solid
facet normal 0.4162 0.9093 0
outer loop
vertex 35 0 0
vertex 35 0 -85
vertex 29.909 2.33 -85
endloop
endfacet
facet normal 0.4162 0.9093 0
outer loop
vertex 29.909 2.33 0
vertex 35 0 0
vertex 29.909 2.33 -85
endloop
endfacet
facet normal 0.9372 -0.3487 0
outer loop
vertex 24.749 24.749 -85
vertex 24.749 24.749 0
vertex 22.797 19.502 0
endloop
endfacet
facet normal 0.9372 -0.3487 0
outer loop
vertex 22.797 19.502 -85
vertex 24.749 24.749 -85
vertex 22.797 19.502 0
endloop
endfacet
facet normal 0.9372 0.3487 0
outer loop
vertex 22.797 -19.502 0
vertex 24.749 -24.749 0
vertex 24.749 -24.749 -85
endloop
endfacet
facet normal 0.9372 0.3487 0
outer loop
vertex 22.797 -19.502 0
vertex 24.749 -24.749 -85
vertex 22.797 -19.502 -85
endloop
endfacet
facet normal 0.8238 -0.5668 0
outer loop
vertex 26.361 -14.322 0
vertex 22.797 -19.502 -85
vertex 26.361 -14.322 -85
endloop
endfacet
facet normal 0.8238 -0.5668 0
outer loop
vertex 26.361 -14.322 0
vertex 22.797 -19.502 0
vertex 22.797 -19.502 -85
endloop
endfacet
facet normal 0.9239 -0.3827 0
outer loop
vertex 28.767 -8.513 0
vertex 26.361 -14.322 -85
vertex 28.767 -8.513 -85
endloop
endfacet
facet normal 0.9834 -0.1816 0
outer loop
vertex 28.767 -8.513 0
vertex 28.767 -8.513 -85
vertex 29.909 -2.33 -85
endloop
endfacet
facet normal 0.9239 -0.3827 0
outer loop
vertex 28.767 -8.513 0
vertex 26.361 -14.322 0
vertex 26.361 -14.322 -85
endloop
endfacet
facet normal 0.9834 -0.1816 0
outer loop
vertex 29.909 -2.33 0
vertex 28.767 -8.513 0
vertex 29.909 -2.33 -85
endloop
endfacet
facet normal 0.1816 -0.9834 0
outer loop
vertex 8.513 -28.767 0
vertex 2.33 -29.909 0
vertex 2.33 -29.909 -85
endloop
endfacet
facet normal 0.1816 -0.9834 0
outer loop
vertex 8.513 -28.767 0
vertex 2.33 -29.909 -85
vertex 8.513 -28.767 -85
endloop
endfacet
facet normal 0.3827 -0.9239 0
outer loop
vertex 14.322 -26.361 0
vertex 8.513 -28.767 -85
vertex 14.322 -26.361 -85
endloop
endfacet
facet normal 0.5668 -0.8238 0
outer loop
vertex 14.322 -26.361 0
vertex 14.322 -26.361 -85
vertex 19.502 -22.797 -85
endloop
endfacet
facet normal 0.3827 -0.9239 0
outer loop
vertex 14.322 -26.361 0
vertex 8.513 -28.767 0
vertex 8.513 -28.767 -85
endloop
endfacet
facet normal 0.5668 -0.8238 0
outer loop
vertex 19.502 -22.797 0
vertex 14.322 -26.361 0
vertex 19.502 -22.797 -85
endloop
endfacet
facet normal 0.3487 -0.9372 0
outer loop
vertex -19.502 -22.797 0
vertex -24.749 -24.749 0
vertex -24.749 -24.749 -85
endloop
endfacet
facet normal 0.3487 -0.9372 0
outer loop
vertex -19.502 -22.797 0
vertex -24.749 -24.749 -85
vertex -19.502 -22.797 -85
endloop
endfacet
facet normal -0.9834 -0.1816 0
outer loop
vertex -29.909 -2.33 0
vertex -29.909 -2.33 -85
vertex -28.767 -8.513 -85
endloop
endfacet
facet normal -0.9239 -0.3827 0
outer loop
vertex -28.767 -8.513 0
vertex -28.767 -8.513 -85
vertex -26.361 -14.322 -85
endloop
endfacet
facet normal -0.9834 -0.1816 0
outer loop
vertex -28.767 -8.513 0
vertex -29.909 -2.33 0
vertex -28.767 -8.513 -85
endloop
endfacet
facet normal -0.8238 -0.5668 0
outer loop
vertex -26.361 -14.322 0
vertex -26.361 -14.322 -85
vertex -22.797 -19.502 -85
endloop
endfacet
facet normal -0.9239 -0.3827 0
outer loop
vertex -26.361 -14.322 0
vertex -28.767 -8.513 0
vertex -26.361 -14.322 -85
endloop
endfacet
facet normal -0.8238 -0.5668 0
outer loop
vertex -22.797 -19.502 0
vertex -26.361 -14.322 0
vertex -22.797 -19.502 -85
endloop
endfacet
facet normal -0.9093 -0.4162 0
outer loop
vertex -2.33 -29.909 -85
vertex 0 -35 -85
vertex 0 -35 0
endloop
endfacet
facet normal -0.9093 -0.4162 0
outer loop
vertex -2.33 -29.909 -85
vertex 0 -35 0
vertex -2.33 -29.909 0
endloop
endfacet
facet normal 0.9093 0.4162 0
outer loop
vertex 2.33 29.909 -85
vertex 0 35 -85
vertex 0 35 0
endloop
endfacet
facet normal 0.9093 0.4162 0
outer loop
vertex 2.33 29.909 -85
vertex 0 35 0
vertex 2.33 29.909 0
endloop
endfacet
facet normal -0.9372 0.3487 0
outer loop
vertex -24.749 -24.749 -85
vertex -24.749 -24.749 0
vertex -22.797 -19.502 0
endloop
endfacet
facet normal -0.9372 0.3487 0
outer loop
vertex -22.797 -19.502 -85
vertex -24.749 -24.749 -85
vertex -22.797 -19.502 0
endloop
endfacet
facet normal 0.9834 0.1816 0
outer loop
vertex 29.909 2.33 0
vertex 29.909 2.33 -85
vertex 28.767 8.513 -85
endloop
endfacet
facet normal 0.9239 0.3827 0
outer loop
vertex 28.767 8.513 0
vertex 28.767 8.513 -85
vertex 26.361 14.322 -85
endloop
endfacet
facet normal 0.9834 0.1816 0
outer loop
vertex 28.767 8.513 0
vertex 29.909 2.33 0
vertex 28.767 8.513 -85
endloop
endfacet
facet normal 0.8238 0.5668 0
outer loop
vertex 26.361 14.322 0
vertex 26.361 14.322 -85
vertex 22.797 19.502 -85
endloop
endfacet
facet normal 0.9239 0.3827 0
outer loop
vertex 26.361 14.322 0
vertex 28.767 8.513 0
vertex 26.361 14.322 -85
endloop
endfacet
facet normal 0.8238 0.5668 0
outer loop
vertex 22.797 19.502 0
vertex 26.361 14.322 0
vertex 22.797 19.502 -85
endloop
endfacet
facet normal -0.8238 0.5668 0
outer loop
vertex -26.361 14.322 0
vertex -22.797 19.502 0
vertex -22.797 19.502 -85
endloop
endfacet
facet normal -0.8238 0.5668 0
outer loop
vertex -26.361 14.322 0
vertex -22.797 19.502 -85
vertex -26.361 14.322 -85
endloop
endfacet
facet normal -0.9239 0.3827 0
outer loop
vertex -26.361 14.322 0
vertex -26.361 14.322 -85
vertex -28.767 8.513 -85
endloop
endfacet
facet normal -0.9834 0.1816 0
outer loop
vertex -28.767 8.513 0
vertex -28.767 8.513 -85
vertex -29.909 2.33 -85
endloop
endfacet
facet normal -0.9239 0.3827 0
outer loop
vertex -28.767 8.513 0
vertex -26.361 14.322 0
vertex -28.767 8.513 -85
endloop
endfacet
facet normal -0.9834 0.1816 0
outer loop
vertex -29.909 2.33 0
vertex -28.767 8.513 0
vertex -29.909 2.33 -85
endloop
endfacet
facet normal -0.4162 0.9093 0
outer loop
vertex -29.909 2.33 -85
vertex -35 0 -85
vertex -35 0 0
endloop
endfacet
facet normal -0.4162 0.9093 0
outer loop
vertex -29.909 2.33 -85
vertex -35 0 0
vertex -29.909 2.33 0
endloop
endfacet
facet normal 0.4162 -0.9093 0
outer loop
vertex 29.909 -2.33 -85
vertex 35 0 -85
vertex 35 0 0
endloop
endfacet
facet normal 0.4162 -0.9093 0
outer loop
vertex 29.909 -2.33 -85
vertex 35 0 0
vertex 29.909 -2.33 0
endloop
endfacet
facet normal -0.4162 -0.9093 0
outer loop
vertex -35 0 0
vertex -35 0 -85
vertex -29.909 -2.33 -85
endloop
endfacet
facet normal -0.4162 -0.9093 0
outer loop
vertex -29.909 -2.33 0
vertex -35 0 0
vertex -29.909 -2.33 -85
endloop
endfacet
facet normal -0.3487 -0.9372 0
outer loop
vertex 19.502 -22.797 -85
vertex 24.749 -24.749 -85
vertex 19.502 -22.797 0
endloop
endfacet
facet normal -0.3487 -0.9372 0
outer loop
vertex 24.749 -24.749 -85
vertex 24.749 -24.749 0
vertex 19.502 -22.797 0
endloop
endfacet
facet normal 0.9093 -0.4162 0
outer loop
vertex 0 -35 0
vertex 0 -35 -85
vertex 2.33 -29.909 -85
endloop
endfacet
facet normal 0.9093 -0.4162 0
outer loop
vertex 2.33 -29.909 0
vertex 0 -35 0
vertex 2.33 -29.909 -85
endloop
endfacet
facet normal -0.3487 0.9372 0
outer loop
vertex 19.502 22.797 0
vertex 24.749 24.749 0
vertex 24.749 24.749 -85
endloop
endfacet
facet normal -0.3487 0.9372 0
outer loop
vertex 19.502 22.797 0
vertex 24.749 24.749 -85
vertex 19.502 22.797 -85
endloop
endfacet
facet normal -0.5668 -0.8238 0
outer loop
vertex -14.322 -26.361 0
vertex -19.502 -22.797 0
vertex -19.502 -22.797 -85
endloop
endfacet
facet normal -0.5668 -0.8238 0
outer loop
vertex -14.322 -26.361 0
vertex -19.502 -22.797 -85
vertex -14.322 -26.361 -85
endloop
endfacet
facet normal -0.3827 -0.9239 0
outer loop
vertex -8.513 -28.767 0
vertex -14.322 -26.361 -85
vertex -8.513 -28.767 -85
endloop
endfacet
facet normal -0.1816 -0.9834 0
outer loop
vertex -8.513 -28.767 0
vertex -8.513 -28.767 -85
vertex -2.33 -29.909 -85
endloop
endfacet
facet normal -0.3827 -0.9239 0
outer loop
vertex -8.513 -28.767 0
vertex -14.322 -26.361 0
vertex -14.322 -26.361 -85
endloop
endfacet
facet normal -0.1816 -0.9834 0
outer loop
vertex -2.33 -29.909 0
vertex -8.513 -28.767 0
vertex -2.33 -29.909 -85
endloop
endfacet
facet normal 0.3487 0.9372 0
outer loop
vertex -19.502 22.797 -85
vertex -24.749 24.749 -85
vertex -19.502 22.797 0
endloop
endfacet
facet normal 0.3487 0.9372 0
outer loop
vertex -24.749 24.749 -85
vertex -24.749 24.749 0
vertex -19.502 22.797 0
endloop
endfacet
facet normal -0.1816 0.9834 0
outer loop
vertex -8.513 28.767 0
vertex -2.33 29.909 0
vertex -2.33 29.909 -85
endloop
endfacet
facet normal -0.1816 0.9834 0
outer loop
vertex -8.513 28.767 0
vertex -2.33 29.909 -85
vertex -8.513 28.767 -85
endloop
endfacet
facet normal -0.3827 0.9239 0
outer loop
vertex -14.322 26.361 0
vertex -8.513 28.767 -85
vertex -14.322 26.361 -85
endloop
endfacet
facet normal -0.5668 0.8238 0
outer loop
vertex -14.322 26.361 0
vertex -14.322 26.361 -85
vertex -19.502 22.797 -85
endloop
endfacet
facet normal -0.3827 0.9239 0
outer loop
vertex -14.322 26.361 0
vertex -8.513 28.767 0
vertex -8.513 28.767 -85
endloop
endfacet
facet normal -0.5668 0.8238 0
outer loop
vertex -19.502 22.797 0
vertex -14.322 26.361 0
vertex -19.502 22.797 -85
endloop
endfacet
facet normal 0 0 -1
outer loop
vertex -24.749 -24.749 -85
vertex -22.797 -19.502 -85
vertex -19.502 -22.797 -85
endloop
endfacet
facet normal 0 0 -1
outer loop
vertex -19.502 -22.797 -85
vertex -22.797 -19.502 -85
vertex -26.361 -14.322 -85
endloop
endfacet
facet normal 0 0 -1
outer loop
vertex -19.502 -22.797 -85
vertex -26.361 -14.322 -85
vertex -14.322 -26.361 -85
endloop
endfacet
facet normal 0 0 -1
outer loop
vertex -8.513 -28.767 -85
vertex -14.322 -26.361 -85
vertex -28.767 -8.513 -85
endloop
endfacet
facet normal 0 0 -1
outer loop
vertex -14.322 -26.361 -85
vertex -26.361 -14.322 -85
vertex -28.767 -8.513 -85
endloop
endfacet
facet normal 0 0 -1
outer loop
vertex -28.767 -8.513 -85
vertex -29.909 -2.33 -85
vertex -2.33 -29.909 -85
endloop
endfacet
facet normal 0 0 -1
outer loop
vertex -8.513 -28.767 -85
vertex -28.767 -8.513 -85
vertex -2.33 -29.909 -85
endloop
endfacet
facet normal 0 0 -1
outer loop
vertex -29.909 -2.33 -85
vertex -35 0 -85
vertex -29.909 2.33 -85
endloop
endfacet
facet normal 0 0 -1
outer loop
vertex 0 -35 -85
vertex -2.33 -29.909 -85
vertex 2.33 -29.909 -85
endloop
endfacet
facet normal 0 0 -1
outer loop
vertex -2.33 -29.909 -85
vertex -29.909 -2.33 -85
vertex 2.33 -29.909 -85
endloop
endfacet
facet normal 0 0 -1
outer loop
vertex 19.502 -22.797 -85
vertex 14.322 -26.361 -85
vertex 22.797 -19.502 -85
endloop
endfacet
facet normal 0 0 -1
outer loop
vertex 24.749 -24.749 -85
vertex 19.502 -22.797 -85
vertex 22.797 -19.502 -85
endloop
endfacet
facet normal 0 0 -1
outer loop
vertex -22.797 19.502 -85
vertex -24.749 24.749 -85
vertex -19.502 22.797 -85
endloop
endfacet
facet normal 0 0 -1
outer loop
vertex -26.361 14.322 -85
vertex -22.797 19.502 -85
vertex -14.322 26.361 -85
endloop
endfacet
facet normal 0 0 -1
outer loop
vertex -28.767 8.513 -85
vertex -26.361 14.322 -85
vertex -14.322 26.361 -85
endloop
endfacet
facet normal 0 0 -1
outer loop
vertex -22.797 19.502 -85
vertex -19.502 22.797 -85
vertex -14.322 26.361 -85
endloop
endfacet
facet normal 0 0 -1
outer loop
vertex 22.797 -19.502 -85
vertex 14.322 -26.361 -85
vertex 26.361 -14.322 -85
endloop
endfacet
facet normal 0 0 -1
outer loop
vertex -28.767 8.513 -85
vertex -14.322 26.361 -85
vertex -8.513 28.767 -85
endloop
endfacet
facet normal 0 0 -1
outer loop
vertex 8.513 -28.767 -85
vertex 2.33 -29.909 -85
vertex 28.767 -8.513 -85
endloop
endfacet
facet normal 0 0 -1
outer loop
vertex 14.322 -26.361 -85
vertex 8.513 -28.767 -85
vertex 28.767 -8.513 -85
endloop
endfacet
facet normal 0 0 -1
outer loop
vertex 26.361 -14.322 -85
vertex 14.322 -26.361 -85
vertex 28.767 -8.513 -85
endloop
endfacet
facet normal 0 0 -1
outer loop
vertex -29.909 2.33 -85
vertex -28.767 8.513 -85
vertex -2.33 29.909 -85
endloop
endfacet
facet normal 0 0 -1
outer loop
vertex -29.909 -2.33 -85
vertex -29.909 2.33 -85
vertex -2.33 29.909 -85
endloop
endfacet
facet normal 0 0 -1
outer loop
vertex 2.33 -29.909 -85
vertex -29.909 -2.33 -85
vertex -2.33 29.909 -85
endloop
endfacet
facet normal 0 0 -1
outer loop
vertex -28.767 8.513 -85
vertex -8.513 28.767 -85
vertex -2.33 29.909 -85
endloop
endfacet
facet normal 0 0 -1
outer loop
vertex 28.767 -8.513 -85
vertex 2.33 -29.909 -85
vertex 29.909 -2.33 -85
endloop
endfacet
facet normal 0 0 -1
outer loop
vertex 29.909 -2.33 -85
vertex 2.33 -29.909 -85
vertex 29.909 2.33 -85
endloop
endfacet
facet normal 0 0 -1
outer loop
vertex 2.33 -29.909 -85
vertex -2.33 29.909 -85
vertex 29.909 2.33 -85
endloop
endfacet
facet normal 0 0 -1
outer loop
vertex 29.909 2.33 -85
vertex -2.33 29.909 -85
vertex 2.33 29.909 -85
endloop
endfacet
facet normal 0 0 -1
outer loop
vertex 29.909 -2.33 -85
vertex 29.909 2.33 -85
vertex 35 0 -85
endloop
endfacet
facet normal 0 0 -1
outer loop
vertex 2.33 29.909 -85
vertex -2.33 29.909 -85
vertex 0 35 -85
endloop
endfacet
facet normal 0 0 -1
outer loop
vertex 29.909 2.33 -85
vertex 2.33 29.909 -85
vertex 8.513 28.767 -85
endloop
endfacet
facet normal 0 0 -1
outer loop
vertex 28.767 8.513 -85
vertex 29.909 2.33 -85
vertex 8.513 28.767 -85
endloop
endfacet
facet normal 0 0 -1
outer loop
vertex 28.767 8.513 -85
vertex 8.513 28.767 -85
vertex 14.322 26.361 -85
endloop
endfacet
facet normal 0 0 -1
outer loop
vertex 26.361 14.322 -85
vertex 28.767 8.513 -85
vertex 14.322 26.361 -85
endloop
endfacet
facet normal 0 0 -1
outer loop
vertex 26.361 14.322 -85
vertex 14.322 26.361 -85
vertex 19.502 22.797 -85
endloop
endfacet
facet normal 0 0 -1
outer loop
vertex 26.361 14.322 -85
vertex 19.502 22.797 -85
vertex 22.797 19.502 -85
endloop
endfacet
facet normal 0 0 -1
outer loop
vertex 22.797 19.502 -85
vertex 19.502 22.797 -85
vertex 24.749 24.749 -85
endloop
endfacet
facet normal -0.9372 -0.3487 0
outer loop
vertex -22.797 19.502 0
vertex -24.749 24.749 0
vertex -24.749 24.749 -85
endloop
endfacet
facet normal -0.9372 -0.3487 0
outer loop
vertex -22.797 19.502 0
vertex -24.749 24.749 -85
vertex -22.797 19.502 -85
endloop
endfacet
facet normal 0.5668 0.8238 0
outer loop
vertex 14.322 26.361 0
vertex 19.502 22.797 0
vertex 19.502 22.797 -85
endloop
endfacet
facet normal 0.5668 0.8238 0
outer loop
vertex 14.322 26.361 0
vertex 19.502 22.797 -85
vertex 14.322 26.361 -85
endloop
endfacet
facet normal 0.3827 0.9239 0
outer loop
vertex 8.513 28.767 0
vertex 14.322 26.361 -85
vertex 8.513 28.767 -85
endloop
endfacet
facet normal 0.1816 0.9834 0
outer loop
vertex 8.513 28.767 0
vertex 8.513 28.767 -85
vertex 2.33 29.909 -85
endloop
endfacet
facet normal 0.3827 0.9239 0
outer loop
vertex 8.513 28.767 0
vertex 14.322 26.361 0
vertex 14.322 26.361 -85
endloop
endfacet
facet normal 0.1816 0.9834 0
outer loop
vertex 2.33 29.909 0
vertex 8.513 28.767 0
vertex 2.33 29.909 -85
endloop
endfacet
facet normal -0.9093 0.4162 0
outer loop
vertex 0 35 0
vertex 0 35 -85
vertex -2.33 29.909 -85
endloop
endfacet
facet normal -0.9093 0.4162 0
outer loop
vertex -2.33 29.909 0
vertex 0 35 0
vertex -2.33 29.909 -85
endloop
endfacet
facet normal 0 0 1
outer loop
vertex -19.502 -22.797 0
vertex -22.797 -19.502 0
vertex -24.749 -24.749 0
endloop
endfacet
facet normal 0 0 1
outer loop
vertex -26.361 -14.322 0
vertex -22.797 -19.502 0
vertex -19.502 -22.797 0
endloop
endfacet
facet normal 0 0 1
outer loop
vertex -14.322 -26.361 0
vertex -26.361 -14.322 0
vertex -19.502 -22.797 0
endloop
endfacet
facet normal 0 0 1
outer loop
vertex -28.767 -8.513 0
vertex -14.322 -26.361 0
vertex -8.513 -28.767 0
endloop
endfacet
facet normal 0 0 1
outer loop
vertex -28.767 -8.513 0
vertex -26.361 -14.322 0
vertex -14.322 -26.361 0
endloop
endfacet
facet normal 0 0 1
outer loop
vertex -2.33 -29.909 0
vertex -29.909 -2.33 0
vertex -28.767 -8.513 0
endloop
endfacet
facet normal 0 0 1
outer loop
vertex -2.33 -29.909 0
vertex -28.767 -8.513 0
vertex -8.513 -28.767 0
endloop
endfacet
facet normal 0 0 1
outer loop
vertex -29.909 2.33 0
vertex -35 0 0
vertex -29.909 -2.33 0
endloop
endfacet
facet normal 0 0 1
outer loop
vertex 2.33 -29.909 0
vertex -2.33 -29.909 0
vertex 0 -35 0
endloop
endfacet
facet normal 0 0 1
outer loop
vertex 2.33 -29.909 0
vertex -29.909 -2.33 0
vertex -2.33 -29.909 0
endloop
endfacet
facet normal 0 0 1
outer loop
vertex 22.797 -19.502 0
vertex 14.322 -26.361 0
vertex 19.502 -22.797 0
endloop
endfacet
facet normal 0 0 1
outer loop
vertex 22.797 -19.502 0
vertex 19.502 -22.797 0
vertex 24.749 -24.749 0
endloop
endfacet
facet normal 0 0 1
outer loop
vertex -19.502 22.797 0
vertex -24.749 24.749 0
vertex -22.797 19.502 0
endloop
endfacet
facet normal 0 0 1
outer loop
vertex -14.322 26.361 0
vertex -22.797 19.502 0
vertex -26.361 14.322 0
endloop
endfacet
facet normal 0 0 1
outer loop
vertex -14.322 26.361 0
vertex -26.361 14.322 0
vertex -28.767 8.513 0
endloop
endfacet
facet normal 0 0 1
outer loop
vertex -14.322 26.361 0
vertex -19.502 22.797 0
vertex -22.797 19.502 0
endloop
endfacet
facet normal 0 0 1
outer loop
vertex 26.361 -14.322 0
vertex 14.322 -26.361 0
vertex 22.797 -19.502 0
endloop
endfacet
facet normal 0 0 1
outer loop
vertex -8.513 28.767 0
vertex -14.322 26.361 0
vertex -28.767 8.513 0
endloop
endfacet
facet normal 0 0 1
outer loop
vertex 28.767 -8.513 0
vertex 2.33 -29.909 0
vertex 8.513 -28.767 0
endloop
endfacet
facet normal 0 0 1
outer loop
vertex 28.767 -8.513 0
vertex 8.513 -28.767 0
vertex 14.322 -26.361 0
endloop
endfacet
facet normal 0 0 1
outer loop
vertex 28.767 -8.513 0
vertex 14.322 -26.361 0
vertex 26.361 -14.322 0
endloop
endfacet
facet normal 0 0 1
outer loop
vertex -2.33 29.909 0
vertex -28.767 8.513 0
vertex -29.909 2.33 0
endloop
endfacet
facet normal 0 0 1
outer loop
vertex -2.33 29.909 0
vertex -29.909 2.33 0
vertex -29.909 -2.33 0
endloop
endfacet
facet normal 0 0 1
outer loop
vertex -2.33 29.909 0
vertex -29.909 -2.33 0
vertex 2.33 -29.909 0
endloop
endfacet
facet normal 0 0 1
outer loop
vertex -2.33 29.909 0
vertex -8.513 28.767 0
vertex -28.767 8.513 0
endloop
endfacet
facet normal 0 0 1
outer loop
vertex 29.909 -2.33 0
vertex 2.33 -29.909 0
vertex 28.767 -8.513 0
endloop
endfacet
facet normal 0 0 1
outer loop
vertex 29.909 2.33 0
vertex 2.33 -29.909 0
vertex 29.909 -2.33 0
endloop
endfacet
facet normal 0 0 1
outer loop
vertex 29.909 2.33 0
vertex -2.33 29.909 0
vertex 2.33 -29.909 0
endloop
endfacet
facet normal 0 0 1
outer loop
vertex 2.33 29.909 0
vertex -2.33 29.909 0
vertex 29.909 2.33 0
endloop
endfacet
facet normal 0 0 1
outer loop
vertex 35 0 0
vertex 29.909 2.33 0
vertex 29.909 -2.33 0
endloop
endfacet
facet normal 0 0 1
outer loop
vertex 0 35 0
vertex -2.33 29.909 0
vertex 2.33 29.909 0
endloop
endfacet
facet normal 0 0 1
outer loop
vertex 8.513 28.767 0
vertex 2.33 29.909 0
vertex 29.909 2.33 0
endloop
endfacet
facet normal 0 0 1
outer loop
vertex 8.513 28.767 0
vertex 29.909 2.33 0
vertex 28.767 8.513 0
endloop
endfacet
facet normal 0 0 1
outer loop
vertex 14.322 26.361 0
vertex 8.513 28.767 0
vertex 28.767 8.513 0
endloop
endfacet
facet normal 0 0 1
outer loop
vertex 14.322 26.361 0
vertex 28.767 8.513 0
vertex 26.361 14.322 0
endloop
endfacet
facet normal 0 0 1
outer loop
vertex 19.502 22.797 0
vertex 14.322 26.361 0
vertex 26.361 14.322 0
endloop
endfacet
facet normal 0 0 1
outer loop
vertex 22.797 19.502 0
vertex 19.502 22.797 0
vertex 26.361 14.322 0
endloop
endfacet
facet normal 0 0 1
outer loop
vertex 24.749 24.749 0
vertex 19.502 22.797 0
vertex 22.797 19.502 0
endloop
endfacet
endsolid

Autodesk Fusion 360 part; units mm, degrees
sketch "Boceto1" plane through (0, 0, 0) normal (0, 0, 1) x (1, 0, 0)
  line L0 (0, 35) -> (-2.3299, 29.9094)
  line L1 (0, 35) -> (2.3299, 29.9094)
  line L2 (-24.7487, 24.7487) -> (-19.5017, 22.7966)
  line L3 (-24.7487, 24.7487) -> (-22.7966, 19.5017)
  line L4 (-35, 0) -> (-29.9094, 2.3299)
  line L5 (-35, 0) -> (-29.9094, -2.3299)
  line L6 (-24.7487, -24.7487) -> (-22.7966, -19.5017)
  line L7 (-24.7487, -24.7487) -> (-19.5017, -22.7966)
  line L8 (0, -35) -> (-2.3299, -29.9094)
  line L9 (0, -35) -> (2.3299, -29.9094)
  line L10 (24.7487, -24.7487) -> (19.5017, -22.7966)
  line L11 (24.7487, -24.7487) -> (22.7966, -19.5017)
  line L12 (35, 0) -> (29.9094, -2.3299)
  line L13 (35, 0) -> (29.9094, 2.3299)
  line L14 (24.7487, 24.7487) -> (22.7966, 19.5017)
  line L15 (24.7487, 24.7487) -> (19.5017, 22.7966)
  arc A0 (-2.3299, 29.9094) -> (-19.5017, 22.7966) centre (0, 0) ccw
  arc A1 (19.5017, 22.7966) -> (2.3299, 29.9094) centre (0, 0) ccw
  arc A2 (29.9094, 2.3299) -> (22.7966, 19.5017) centre (0, 0) ccw
  arc A3 (22.7966, -19.5017) -> (29.9094, -2.3299) centre (0, 0) ccw
  arc A4 (2.3299, -29.9094) -> (19.5017, -22.7966) centre (0, 0) ccw
  arc A5 (-19.5017, -22.7966) -> (-2.3299, -29.9094) centre (0, 0) ccw
  arc A6 (-22.7966, 19.5017) -> (-29.9094, 2.3299) centre (0, 0) ccw
  arc A7 (-29.9094, -2.3299) -> (-22.7966, -19.5017) centre (0, 0) ccw
  dimension "d1" = 60
  dimension "d3" = 360
extrude "Extruir1" add sketch "Boceto1" against normal blind 85
